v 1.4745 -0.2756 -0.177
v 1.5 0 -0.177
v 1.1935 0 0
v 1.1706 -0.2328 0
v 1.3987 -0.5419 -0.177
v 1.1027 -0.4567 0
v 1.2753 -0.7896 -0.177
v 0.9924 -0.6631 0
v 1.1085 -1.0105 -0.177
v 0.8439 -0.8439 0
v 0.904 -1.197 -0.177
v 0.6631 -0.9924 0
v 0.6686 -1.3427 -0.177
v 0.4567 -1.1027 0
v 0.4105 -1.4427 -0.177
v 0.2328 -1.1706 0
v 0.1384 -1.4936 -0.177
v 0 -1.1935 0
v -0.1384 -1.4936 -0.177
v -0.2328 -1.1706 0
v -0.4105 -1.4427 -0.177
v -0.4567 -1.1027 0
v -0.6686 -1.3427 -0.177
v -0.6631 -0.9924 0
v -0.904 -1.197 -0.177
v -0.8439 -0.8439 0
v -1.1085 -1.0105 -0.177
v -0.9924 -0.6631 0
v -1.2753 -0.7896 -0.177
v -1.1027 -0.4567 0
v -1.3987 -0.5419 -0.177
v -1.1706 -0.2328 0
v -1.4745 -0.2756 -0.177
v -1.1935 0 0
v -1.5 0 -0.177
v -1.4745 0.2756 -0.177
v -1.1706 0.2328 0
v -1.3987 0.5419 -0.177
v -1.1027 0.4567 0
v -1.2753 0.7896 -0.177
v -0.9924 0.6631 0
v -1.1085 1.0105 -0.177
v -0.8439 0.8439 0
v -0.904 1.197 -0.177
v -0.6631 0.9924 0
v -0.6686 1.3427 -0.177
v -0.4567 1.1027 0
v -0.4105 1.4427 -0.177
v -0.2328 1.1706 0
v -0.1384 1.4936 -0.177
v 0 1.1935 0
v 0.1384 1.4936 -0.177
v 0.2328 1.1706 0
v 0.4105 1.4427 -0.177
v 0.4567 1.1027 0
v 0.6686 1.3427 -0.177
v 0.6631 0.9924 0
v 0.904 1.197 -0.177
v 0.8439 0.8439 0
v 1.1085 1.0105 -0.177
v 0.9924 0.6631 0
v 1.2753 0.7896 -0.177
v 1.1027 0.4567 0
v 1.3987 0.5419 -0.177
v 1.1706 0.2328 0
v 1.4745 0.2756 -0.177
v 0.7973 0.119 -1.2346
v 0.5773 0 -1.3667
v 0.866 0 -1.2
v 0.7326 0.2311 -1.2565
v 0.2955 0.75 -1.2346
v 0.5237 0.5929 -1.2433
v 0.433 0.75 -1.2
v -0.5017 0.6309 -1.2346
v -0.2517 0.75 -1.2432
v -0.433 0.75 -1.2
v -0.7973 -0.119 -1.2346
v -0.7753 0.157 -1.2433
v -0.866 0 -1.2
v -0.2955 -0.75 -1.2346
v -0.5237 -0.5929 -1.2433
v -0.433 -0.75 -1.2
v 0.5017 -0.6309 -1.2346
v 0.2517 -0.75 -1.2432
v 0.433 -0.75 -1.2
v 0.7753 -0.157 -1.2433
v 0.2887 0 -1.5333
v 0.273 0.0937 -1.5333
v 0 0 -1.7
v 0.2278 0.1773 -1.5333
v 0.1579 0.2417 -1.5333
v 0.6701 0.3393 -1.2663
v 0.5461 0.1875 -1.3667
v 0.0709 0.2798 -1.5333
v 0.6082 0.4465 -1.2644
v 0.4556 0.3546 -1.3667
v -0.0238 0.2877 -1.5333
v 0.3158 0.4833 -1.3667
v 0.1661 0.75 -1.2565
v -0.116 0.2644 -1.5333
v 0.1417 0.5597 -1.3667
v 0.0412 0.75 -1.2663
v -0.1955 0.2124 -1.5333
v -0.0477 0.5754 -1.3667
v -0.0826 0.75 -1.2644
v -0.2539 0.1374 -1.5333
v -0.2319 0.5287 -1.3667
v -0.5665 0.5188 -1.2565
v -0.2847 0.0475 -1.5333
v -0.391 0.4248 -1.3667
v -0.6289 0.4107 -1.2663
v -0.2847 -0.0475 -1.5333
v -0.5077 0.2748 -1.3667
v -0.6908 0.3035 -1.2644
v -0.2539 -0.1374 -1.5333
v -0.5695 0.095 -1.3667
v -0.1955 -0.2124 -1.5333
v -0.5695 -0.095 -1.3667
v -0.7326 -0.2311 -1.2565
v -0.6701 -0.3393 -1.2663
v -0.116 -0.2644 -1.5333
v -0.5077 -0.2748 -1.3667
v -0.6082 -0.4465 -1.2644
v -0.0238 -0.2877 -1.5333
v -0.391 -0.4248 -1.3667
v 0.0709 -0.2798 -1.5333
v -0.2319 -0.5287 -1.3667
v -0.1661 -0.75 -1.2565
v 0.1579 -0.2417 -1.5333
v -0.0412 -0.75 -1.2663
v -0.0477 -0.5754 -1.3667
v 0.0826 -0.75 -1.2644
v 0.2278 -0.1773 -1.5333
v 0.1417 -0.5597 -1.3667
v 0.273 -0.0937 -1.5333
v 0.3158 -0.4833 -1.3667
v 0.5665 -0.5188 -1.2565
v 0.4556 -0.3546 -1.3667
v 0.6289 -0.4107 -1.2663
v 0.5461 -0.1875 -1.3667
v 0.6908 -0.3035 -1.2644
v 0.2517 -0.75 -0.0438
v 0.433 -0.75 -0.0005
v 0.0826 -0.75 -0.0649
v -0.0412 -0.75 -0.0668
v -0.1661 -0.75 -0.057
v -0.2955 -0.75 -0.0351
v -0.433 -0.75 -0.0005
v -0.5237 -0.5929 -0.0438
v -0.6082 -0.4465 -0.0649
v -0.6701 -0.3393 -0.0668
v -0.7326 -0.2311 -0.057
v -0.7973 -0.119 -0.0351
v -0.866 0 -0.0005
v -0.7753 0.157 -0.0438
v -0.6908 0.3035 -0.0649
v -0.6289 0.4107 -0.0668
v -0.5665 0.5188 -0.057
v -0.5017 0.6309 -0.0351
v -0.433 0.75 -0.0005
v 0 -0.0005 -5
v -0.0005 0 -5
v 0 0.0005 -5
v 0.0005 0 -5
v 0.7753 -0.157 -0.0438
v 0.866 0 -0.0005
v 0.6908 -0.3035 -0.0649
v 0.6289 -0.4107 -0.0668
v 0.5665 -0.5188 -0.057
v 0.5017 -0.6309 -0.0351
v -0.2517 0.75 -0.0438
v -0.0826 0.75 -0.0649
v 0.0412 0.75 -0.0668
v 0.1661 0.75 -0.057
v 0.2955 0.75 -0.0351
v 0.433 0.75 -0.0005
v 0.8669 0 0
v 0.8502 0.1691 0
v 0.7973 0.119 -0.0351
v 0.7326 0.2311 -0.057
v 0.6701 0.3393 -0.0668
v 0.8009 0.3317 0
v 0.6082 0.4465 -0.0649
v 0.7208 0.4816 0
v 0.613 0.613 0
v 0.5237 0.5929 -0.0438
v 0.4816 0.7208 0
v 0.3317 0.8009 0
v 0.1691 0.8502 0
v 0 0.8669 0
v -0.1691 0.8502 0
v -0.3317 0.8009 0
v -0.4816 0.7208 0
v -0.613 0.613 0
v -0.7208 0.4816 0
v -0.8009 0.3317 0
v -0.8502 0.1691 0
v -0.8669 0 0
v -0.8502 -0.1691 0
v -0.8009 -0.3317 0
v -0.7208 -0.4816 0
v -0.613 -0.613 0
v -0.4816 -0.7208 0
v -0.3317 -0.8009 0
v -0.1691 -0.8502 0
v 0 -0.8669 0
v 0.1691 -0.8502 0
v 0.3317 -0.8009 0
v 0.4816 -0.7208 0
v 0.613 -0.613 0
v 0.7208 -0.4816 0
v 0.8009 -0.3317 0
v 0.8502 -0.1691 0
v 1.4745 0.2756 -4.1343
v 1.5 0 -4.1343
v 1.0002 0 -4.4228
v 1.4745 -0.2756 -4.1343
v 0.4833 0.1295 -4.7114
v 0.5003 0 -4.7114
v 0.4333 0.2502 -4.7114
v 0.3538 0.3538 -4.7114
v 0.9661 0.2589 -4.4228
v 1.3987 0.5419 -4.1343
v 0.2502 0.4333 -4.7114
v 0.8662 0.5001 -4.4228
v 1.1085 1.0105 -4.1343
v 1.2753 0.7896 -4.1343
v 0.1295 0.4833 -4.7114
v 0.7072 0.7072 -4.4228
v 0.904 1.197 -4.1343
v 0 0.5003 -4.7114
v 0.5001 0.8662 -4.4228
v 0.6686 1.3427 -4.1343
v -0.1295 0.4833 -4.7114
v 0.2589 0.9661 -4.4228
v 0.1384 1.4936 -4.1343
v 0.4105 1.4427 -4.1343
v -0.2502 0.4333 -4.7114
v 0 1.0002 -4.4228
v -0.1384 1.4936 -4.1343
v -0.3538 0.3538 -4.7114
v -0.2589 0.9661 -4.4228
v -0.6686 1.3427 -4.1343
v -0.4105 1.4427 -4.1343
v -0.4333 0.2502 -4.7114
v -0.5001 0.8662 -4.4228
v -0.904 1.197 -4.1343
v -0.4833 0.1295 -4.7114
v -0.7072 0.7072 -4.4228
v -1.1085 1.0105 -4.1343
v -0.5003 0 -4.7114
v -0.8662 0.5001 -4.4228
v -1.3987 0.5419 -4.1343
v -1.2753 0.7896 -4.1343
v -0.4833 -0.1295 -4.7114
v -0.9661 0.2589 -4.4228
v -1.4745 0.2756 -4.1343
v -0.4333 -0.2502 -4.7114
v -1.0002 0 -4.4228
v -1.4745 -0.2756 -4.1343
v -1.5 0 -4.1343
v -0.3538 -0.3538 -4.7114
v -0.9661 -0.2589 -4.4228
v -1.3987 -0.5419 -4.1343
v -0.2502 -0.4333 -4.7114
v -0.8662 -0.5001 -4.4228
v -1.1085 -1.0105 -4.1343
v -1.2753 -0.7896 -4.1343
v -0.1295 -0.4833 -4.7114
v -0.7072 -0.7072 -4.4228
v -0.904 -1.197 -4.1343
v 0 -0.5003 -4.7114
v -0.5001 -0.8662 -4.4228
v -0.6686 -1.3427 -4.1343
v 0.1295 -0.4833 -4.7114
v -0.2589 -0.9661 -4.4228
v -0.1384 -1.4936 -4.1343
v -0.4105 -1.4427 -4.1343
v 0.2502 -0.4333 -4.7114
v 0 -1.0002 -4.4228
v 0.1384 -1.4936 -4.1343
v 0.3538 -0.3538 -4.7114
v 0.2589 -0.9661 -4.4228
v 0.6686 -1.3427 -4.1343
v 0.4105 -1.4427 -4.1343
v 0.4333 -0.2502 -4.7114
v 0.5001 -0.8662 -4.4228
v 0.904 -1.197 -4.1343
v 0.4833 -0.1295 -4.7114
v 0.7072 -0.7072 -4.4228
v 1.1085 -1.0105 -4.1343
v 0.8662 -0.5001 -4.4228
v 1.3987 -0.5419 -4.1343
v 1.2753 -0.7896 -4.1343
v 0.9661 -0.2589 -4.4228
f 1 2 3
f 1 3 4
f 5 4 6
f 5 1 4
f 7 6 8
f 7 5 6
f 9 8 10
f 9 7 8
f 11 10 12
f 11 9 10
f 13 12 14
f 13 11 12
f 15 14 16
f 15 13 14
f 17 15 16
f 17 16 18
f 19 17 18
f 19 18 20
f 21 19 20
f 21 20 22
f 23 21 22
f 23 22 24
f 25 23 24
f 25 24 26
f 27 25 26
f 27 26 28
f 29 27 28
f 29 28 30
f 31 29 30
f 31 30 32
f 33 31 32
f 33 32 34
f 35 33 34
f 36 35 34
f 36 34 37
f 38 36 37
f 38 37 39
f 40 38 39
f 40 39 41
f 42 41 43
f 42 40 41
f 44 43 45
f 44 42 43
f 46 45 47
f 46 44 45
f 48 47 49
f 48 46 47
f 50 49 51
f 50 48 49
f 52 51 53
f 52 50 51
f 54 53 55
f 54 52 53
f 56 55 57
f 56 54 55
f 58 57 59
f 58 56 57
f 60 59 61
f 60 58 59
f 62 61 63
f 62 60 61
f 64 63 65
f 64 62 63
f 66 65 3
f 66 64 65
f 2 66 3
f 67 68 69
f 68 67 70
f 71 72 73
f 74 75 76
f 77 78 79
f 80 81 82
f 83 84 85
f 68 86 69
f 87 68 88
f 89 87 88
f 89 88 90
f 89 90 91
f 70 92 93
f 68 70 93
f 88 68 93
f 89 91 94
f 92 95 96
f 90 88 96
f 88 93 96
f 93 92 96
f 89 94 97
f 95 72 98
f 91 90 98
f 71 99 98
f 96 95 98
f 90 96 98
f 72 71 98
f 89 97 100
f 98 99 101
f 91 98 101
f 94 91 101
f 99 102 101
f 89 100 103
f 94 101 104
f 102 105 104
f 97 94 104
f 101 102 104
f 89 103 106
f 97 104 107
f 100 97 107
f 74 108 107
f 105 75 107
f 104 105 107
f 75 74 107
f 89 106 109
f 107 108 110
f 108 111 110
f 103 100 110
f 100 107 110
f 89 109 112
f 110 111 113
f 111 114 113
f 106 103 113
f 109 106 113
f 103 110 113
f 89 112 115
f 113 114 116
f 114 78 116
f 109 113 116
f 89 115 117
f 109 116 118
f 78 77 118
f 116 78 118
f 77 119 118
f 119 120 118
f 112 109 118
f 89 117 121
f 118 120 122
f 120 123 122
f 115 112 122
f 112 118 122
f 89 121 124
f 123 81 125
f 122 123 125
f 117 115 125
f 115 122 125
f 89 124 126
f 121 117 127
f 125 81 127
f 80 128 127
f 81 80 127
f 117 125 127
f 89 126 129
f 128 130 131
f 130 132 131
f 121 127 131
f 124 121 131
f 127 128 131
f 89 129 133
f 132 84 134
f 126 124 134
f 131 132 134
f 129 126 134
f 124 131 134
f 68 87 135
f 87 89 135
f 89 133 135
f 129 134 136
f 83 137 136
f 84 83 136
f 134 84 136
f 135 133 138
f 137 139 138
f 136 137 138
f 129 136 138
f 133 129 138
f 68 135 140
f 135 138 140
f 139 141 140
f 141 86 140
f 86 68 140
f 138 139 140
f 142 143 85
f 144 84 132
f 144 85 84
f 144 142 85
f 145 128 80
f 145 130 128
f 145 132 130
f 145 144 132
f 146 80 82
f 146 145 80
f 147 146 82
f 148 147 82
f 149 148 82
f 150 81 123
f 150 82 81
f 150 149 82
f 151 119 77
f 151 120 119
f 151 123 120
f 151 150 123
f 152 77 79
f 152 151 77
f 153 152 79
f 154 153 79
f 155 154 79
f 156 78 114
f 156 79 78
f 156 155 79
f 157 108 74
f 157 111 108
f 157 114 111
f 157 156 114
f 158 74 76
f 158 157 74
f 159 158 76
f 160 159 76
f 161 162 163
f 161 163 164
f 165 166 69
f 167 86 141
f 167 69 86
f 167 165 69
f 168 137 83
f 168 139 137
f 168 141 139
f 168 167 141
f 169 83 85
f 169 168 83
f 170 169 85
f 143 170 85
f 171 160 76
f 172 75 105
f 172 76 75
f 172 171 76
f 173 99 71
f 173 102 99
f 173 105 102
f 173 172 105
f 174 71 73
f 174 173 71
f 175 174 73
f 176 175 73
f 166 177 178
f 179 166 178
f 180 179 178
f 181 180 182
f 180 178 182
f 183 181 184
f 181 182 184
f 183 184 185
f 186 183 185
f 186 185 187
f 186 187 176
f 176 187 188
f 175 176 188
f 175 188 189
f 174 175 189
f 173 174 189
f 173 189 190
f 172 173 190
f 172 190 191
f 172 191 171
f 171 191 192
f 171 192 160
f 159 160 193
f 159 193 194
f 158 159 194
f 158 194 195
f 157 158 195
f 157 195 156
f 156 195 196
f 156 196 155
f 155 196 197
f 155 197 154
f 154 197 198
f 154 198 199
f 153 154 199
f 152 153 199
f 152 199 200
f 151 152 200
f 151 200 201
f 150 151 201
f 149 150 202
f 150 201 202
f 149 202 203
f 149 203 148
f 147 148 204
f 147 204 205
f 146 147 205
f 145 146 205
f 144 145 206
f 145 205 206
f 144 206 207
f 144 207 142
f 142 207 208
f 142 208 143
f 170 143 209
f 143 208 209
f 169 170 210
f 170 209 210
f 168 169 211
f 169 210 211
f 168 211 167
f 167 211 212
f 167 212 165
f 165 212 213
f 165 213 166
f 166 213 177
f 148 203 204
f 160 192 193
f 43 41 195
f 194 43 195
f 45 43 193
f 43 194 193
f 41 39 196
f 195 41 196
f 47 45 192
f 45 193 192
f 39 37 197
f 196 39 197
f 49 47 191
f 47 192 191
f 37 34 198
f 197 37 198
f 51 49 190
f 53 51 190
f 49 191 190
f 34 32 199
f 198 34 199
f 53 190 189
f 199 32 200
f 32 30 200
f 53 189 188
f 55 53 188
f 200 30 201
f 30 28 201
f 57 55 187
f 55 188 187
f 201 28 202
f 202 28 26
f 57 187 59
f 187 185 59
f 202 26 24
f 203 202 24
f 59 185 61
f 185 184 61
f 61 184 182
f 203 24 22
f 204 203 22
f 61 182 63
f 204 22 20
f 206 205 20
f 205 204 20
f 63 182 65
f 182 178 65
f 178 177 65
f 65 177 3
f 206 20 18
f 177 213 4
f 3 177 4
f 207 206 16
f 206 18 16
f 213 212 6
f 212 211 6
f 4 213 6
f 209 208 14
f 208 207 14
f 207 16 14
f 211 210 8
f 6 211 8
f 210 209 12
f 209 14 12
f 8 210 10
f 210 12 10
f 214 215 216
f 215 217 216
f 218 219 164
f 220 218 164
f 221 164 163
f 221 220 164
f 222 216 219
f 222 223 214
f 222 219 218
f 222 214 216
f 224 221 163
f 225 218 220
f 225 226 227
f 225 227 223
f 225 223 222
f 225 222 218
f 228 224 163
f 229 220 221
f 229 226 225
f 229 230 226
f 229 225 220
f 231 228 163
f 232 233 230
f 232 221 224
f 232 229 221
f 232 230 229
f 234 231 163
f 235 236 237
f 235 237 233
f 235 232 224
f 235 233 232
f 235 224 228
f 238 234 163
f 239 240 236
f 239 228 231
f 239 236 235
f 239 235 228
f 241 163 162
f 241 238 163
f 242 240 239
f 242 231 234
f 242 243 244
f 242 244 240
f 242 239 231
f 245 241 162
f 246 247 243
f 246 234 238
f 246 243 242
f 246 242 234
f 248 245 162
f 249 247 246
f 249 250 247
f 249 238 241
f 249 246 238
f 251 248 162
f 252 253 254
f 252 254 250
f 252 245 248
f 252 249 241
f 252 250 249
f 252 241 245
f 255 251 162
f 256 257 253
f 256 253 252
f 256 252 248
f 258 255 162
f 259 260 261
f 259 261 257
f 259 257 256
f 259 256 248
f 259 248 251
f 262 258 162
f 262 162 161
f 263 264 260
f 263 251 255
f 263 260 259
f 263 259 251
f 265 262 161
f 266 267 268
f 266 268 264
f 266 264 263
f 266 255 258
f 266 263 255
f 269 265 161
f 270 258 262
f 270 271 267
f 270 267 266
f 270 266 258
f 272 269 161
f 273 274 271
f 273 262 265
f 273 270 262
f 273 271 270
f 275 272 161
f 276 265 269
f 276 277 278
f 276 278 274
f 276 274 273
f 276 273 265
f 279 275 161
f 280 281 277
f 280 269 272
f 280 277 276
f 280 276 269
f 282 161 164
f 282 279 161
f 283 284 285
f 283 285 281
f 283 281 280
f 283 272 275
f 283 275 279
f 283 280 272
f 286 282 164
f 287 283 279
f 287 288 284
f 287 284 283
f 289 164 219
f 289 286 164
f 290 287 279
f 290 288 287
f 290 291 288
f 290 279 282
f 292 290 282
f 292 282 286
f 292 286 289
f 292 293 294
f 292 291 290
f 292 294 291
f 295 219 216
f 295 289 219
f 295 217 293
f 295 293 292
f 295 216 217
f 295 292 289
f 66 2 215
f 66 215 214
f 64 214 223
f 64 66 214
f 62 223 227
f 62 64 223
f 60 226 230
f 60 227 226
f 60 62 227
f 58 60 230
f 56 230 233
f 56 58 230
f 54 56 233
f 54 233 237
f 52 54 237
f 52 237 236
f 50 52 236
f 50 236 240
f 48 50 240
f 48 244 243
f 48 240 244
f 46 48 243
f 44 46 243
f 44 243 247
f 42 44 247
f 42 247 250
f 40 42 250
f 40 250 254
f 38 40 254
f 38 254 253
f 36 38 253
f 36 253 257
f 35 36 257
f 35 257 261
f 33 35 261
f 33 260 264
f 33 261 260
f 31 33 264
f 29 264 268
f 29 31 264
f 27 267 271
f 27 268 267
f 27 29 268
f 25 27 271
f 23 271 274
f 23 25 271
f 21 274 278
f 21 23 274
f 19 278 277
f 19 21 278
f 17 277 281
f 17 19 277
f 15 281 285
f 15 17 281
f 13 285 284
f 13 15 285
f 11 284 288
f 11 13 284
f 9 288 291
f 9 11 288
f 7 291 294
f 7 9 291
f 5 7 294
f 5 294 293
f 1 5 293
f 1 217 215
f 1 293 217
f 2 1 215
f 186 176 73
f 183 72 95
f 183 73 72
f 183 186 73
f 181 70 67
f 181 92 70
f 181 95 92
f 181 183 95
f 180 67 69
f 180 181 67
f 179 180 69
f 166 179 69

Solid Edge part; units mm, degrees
sketch "Sketch1" plane through (0, 0, 0) normal (0, -1, 0) x (1, 0, 0)
  line L0 (0, -5) -> (1.5, -5)
  line L1 (1.5, -5) -> (1.5, 0)
  line L2 (1.5, 0) -> (0.866, 0)
  line L3 (0.866, 0) -> (0.866, -1.2)
  line L4 (0.866, -1.2) -> (0, -1.7)
  dimension "D1" = 1.5
  dimension "D2" = 5
  dimension "D3" = 1.2
  dimension "D4" = 0.75
revolve "RevolvedProtrusion1" add sketch "Sketch1" angle 360 about axis through (0, 0, -7.6667) along (0, 0, -1)
sketch "Sketch2" plane through (0, 0, 0) normal (0, 0, 1) x (1, 0, 0)
  circle A0 centre (0, 0) radius 1.1935
  line L0 (-0.433, 0.75) -> (0.433, 0.75)
  line L1 (0.433, 0.75) -> (0.866, 0)
  line L2 (0.866, 0) -> (0.433, -0.75)
  line L3 (0.433, -0.75) -> (-0.433, -0.75)
  line L4 (-0.433, -0.75) -> (-0.866, 0)
  line L5 (-0.866, 0) -> (-0.433, 0.75)
  dimension "D1" = 1.5
  dimension "D2" = 2.387
extrude "ExtrudedProtrusion_1" add sketch "Sketch2" against normal blind 5
sketch "Sketch3" plane through (0, 0, 0) normal (0, -1, 0) x (1, 0, 0)
  line L0 (0, -0.5005) -> (0.8669, 0)
  line L1 (0.8669, 0) -> (0, 0)
  dimension "D1" = 0.7507
revolve "RevolvedCutout_1" cut sketch "Sketch3" angle 360 about axis through (0, 0, 0) along (0, 0, -1)
cosmetic_thread "Thread_1" size "M3" thread depth 5
chamfer "Chamfer_1" distance 0.3065 angle 30 1 edges at (-1.5, 0, 0) measured on face at (-1.03, 0.97, 0)
chamfer "Chamfer_2" distance 1.4995 angle 30 1 edges at (-1.5, 0, -5) measured on face at (1.03, 0.97, -5)
properties material "Stahl"
